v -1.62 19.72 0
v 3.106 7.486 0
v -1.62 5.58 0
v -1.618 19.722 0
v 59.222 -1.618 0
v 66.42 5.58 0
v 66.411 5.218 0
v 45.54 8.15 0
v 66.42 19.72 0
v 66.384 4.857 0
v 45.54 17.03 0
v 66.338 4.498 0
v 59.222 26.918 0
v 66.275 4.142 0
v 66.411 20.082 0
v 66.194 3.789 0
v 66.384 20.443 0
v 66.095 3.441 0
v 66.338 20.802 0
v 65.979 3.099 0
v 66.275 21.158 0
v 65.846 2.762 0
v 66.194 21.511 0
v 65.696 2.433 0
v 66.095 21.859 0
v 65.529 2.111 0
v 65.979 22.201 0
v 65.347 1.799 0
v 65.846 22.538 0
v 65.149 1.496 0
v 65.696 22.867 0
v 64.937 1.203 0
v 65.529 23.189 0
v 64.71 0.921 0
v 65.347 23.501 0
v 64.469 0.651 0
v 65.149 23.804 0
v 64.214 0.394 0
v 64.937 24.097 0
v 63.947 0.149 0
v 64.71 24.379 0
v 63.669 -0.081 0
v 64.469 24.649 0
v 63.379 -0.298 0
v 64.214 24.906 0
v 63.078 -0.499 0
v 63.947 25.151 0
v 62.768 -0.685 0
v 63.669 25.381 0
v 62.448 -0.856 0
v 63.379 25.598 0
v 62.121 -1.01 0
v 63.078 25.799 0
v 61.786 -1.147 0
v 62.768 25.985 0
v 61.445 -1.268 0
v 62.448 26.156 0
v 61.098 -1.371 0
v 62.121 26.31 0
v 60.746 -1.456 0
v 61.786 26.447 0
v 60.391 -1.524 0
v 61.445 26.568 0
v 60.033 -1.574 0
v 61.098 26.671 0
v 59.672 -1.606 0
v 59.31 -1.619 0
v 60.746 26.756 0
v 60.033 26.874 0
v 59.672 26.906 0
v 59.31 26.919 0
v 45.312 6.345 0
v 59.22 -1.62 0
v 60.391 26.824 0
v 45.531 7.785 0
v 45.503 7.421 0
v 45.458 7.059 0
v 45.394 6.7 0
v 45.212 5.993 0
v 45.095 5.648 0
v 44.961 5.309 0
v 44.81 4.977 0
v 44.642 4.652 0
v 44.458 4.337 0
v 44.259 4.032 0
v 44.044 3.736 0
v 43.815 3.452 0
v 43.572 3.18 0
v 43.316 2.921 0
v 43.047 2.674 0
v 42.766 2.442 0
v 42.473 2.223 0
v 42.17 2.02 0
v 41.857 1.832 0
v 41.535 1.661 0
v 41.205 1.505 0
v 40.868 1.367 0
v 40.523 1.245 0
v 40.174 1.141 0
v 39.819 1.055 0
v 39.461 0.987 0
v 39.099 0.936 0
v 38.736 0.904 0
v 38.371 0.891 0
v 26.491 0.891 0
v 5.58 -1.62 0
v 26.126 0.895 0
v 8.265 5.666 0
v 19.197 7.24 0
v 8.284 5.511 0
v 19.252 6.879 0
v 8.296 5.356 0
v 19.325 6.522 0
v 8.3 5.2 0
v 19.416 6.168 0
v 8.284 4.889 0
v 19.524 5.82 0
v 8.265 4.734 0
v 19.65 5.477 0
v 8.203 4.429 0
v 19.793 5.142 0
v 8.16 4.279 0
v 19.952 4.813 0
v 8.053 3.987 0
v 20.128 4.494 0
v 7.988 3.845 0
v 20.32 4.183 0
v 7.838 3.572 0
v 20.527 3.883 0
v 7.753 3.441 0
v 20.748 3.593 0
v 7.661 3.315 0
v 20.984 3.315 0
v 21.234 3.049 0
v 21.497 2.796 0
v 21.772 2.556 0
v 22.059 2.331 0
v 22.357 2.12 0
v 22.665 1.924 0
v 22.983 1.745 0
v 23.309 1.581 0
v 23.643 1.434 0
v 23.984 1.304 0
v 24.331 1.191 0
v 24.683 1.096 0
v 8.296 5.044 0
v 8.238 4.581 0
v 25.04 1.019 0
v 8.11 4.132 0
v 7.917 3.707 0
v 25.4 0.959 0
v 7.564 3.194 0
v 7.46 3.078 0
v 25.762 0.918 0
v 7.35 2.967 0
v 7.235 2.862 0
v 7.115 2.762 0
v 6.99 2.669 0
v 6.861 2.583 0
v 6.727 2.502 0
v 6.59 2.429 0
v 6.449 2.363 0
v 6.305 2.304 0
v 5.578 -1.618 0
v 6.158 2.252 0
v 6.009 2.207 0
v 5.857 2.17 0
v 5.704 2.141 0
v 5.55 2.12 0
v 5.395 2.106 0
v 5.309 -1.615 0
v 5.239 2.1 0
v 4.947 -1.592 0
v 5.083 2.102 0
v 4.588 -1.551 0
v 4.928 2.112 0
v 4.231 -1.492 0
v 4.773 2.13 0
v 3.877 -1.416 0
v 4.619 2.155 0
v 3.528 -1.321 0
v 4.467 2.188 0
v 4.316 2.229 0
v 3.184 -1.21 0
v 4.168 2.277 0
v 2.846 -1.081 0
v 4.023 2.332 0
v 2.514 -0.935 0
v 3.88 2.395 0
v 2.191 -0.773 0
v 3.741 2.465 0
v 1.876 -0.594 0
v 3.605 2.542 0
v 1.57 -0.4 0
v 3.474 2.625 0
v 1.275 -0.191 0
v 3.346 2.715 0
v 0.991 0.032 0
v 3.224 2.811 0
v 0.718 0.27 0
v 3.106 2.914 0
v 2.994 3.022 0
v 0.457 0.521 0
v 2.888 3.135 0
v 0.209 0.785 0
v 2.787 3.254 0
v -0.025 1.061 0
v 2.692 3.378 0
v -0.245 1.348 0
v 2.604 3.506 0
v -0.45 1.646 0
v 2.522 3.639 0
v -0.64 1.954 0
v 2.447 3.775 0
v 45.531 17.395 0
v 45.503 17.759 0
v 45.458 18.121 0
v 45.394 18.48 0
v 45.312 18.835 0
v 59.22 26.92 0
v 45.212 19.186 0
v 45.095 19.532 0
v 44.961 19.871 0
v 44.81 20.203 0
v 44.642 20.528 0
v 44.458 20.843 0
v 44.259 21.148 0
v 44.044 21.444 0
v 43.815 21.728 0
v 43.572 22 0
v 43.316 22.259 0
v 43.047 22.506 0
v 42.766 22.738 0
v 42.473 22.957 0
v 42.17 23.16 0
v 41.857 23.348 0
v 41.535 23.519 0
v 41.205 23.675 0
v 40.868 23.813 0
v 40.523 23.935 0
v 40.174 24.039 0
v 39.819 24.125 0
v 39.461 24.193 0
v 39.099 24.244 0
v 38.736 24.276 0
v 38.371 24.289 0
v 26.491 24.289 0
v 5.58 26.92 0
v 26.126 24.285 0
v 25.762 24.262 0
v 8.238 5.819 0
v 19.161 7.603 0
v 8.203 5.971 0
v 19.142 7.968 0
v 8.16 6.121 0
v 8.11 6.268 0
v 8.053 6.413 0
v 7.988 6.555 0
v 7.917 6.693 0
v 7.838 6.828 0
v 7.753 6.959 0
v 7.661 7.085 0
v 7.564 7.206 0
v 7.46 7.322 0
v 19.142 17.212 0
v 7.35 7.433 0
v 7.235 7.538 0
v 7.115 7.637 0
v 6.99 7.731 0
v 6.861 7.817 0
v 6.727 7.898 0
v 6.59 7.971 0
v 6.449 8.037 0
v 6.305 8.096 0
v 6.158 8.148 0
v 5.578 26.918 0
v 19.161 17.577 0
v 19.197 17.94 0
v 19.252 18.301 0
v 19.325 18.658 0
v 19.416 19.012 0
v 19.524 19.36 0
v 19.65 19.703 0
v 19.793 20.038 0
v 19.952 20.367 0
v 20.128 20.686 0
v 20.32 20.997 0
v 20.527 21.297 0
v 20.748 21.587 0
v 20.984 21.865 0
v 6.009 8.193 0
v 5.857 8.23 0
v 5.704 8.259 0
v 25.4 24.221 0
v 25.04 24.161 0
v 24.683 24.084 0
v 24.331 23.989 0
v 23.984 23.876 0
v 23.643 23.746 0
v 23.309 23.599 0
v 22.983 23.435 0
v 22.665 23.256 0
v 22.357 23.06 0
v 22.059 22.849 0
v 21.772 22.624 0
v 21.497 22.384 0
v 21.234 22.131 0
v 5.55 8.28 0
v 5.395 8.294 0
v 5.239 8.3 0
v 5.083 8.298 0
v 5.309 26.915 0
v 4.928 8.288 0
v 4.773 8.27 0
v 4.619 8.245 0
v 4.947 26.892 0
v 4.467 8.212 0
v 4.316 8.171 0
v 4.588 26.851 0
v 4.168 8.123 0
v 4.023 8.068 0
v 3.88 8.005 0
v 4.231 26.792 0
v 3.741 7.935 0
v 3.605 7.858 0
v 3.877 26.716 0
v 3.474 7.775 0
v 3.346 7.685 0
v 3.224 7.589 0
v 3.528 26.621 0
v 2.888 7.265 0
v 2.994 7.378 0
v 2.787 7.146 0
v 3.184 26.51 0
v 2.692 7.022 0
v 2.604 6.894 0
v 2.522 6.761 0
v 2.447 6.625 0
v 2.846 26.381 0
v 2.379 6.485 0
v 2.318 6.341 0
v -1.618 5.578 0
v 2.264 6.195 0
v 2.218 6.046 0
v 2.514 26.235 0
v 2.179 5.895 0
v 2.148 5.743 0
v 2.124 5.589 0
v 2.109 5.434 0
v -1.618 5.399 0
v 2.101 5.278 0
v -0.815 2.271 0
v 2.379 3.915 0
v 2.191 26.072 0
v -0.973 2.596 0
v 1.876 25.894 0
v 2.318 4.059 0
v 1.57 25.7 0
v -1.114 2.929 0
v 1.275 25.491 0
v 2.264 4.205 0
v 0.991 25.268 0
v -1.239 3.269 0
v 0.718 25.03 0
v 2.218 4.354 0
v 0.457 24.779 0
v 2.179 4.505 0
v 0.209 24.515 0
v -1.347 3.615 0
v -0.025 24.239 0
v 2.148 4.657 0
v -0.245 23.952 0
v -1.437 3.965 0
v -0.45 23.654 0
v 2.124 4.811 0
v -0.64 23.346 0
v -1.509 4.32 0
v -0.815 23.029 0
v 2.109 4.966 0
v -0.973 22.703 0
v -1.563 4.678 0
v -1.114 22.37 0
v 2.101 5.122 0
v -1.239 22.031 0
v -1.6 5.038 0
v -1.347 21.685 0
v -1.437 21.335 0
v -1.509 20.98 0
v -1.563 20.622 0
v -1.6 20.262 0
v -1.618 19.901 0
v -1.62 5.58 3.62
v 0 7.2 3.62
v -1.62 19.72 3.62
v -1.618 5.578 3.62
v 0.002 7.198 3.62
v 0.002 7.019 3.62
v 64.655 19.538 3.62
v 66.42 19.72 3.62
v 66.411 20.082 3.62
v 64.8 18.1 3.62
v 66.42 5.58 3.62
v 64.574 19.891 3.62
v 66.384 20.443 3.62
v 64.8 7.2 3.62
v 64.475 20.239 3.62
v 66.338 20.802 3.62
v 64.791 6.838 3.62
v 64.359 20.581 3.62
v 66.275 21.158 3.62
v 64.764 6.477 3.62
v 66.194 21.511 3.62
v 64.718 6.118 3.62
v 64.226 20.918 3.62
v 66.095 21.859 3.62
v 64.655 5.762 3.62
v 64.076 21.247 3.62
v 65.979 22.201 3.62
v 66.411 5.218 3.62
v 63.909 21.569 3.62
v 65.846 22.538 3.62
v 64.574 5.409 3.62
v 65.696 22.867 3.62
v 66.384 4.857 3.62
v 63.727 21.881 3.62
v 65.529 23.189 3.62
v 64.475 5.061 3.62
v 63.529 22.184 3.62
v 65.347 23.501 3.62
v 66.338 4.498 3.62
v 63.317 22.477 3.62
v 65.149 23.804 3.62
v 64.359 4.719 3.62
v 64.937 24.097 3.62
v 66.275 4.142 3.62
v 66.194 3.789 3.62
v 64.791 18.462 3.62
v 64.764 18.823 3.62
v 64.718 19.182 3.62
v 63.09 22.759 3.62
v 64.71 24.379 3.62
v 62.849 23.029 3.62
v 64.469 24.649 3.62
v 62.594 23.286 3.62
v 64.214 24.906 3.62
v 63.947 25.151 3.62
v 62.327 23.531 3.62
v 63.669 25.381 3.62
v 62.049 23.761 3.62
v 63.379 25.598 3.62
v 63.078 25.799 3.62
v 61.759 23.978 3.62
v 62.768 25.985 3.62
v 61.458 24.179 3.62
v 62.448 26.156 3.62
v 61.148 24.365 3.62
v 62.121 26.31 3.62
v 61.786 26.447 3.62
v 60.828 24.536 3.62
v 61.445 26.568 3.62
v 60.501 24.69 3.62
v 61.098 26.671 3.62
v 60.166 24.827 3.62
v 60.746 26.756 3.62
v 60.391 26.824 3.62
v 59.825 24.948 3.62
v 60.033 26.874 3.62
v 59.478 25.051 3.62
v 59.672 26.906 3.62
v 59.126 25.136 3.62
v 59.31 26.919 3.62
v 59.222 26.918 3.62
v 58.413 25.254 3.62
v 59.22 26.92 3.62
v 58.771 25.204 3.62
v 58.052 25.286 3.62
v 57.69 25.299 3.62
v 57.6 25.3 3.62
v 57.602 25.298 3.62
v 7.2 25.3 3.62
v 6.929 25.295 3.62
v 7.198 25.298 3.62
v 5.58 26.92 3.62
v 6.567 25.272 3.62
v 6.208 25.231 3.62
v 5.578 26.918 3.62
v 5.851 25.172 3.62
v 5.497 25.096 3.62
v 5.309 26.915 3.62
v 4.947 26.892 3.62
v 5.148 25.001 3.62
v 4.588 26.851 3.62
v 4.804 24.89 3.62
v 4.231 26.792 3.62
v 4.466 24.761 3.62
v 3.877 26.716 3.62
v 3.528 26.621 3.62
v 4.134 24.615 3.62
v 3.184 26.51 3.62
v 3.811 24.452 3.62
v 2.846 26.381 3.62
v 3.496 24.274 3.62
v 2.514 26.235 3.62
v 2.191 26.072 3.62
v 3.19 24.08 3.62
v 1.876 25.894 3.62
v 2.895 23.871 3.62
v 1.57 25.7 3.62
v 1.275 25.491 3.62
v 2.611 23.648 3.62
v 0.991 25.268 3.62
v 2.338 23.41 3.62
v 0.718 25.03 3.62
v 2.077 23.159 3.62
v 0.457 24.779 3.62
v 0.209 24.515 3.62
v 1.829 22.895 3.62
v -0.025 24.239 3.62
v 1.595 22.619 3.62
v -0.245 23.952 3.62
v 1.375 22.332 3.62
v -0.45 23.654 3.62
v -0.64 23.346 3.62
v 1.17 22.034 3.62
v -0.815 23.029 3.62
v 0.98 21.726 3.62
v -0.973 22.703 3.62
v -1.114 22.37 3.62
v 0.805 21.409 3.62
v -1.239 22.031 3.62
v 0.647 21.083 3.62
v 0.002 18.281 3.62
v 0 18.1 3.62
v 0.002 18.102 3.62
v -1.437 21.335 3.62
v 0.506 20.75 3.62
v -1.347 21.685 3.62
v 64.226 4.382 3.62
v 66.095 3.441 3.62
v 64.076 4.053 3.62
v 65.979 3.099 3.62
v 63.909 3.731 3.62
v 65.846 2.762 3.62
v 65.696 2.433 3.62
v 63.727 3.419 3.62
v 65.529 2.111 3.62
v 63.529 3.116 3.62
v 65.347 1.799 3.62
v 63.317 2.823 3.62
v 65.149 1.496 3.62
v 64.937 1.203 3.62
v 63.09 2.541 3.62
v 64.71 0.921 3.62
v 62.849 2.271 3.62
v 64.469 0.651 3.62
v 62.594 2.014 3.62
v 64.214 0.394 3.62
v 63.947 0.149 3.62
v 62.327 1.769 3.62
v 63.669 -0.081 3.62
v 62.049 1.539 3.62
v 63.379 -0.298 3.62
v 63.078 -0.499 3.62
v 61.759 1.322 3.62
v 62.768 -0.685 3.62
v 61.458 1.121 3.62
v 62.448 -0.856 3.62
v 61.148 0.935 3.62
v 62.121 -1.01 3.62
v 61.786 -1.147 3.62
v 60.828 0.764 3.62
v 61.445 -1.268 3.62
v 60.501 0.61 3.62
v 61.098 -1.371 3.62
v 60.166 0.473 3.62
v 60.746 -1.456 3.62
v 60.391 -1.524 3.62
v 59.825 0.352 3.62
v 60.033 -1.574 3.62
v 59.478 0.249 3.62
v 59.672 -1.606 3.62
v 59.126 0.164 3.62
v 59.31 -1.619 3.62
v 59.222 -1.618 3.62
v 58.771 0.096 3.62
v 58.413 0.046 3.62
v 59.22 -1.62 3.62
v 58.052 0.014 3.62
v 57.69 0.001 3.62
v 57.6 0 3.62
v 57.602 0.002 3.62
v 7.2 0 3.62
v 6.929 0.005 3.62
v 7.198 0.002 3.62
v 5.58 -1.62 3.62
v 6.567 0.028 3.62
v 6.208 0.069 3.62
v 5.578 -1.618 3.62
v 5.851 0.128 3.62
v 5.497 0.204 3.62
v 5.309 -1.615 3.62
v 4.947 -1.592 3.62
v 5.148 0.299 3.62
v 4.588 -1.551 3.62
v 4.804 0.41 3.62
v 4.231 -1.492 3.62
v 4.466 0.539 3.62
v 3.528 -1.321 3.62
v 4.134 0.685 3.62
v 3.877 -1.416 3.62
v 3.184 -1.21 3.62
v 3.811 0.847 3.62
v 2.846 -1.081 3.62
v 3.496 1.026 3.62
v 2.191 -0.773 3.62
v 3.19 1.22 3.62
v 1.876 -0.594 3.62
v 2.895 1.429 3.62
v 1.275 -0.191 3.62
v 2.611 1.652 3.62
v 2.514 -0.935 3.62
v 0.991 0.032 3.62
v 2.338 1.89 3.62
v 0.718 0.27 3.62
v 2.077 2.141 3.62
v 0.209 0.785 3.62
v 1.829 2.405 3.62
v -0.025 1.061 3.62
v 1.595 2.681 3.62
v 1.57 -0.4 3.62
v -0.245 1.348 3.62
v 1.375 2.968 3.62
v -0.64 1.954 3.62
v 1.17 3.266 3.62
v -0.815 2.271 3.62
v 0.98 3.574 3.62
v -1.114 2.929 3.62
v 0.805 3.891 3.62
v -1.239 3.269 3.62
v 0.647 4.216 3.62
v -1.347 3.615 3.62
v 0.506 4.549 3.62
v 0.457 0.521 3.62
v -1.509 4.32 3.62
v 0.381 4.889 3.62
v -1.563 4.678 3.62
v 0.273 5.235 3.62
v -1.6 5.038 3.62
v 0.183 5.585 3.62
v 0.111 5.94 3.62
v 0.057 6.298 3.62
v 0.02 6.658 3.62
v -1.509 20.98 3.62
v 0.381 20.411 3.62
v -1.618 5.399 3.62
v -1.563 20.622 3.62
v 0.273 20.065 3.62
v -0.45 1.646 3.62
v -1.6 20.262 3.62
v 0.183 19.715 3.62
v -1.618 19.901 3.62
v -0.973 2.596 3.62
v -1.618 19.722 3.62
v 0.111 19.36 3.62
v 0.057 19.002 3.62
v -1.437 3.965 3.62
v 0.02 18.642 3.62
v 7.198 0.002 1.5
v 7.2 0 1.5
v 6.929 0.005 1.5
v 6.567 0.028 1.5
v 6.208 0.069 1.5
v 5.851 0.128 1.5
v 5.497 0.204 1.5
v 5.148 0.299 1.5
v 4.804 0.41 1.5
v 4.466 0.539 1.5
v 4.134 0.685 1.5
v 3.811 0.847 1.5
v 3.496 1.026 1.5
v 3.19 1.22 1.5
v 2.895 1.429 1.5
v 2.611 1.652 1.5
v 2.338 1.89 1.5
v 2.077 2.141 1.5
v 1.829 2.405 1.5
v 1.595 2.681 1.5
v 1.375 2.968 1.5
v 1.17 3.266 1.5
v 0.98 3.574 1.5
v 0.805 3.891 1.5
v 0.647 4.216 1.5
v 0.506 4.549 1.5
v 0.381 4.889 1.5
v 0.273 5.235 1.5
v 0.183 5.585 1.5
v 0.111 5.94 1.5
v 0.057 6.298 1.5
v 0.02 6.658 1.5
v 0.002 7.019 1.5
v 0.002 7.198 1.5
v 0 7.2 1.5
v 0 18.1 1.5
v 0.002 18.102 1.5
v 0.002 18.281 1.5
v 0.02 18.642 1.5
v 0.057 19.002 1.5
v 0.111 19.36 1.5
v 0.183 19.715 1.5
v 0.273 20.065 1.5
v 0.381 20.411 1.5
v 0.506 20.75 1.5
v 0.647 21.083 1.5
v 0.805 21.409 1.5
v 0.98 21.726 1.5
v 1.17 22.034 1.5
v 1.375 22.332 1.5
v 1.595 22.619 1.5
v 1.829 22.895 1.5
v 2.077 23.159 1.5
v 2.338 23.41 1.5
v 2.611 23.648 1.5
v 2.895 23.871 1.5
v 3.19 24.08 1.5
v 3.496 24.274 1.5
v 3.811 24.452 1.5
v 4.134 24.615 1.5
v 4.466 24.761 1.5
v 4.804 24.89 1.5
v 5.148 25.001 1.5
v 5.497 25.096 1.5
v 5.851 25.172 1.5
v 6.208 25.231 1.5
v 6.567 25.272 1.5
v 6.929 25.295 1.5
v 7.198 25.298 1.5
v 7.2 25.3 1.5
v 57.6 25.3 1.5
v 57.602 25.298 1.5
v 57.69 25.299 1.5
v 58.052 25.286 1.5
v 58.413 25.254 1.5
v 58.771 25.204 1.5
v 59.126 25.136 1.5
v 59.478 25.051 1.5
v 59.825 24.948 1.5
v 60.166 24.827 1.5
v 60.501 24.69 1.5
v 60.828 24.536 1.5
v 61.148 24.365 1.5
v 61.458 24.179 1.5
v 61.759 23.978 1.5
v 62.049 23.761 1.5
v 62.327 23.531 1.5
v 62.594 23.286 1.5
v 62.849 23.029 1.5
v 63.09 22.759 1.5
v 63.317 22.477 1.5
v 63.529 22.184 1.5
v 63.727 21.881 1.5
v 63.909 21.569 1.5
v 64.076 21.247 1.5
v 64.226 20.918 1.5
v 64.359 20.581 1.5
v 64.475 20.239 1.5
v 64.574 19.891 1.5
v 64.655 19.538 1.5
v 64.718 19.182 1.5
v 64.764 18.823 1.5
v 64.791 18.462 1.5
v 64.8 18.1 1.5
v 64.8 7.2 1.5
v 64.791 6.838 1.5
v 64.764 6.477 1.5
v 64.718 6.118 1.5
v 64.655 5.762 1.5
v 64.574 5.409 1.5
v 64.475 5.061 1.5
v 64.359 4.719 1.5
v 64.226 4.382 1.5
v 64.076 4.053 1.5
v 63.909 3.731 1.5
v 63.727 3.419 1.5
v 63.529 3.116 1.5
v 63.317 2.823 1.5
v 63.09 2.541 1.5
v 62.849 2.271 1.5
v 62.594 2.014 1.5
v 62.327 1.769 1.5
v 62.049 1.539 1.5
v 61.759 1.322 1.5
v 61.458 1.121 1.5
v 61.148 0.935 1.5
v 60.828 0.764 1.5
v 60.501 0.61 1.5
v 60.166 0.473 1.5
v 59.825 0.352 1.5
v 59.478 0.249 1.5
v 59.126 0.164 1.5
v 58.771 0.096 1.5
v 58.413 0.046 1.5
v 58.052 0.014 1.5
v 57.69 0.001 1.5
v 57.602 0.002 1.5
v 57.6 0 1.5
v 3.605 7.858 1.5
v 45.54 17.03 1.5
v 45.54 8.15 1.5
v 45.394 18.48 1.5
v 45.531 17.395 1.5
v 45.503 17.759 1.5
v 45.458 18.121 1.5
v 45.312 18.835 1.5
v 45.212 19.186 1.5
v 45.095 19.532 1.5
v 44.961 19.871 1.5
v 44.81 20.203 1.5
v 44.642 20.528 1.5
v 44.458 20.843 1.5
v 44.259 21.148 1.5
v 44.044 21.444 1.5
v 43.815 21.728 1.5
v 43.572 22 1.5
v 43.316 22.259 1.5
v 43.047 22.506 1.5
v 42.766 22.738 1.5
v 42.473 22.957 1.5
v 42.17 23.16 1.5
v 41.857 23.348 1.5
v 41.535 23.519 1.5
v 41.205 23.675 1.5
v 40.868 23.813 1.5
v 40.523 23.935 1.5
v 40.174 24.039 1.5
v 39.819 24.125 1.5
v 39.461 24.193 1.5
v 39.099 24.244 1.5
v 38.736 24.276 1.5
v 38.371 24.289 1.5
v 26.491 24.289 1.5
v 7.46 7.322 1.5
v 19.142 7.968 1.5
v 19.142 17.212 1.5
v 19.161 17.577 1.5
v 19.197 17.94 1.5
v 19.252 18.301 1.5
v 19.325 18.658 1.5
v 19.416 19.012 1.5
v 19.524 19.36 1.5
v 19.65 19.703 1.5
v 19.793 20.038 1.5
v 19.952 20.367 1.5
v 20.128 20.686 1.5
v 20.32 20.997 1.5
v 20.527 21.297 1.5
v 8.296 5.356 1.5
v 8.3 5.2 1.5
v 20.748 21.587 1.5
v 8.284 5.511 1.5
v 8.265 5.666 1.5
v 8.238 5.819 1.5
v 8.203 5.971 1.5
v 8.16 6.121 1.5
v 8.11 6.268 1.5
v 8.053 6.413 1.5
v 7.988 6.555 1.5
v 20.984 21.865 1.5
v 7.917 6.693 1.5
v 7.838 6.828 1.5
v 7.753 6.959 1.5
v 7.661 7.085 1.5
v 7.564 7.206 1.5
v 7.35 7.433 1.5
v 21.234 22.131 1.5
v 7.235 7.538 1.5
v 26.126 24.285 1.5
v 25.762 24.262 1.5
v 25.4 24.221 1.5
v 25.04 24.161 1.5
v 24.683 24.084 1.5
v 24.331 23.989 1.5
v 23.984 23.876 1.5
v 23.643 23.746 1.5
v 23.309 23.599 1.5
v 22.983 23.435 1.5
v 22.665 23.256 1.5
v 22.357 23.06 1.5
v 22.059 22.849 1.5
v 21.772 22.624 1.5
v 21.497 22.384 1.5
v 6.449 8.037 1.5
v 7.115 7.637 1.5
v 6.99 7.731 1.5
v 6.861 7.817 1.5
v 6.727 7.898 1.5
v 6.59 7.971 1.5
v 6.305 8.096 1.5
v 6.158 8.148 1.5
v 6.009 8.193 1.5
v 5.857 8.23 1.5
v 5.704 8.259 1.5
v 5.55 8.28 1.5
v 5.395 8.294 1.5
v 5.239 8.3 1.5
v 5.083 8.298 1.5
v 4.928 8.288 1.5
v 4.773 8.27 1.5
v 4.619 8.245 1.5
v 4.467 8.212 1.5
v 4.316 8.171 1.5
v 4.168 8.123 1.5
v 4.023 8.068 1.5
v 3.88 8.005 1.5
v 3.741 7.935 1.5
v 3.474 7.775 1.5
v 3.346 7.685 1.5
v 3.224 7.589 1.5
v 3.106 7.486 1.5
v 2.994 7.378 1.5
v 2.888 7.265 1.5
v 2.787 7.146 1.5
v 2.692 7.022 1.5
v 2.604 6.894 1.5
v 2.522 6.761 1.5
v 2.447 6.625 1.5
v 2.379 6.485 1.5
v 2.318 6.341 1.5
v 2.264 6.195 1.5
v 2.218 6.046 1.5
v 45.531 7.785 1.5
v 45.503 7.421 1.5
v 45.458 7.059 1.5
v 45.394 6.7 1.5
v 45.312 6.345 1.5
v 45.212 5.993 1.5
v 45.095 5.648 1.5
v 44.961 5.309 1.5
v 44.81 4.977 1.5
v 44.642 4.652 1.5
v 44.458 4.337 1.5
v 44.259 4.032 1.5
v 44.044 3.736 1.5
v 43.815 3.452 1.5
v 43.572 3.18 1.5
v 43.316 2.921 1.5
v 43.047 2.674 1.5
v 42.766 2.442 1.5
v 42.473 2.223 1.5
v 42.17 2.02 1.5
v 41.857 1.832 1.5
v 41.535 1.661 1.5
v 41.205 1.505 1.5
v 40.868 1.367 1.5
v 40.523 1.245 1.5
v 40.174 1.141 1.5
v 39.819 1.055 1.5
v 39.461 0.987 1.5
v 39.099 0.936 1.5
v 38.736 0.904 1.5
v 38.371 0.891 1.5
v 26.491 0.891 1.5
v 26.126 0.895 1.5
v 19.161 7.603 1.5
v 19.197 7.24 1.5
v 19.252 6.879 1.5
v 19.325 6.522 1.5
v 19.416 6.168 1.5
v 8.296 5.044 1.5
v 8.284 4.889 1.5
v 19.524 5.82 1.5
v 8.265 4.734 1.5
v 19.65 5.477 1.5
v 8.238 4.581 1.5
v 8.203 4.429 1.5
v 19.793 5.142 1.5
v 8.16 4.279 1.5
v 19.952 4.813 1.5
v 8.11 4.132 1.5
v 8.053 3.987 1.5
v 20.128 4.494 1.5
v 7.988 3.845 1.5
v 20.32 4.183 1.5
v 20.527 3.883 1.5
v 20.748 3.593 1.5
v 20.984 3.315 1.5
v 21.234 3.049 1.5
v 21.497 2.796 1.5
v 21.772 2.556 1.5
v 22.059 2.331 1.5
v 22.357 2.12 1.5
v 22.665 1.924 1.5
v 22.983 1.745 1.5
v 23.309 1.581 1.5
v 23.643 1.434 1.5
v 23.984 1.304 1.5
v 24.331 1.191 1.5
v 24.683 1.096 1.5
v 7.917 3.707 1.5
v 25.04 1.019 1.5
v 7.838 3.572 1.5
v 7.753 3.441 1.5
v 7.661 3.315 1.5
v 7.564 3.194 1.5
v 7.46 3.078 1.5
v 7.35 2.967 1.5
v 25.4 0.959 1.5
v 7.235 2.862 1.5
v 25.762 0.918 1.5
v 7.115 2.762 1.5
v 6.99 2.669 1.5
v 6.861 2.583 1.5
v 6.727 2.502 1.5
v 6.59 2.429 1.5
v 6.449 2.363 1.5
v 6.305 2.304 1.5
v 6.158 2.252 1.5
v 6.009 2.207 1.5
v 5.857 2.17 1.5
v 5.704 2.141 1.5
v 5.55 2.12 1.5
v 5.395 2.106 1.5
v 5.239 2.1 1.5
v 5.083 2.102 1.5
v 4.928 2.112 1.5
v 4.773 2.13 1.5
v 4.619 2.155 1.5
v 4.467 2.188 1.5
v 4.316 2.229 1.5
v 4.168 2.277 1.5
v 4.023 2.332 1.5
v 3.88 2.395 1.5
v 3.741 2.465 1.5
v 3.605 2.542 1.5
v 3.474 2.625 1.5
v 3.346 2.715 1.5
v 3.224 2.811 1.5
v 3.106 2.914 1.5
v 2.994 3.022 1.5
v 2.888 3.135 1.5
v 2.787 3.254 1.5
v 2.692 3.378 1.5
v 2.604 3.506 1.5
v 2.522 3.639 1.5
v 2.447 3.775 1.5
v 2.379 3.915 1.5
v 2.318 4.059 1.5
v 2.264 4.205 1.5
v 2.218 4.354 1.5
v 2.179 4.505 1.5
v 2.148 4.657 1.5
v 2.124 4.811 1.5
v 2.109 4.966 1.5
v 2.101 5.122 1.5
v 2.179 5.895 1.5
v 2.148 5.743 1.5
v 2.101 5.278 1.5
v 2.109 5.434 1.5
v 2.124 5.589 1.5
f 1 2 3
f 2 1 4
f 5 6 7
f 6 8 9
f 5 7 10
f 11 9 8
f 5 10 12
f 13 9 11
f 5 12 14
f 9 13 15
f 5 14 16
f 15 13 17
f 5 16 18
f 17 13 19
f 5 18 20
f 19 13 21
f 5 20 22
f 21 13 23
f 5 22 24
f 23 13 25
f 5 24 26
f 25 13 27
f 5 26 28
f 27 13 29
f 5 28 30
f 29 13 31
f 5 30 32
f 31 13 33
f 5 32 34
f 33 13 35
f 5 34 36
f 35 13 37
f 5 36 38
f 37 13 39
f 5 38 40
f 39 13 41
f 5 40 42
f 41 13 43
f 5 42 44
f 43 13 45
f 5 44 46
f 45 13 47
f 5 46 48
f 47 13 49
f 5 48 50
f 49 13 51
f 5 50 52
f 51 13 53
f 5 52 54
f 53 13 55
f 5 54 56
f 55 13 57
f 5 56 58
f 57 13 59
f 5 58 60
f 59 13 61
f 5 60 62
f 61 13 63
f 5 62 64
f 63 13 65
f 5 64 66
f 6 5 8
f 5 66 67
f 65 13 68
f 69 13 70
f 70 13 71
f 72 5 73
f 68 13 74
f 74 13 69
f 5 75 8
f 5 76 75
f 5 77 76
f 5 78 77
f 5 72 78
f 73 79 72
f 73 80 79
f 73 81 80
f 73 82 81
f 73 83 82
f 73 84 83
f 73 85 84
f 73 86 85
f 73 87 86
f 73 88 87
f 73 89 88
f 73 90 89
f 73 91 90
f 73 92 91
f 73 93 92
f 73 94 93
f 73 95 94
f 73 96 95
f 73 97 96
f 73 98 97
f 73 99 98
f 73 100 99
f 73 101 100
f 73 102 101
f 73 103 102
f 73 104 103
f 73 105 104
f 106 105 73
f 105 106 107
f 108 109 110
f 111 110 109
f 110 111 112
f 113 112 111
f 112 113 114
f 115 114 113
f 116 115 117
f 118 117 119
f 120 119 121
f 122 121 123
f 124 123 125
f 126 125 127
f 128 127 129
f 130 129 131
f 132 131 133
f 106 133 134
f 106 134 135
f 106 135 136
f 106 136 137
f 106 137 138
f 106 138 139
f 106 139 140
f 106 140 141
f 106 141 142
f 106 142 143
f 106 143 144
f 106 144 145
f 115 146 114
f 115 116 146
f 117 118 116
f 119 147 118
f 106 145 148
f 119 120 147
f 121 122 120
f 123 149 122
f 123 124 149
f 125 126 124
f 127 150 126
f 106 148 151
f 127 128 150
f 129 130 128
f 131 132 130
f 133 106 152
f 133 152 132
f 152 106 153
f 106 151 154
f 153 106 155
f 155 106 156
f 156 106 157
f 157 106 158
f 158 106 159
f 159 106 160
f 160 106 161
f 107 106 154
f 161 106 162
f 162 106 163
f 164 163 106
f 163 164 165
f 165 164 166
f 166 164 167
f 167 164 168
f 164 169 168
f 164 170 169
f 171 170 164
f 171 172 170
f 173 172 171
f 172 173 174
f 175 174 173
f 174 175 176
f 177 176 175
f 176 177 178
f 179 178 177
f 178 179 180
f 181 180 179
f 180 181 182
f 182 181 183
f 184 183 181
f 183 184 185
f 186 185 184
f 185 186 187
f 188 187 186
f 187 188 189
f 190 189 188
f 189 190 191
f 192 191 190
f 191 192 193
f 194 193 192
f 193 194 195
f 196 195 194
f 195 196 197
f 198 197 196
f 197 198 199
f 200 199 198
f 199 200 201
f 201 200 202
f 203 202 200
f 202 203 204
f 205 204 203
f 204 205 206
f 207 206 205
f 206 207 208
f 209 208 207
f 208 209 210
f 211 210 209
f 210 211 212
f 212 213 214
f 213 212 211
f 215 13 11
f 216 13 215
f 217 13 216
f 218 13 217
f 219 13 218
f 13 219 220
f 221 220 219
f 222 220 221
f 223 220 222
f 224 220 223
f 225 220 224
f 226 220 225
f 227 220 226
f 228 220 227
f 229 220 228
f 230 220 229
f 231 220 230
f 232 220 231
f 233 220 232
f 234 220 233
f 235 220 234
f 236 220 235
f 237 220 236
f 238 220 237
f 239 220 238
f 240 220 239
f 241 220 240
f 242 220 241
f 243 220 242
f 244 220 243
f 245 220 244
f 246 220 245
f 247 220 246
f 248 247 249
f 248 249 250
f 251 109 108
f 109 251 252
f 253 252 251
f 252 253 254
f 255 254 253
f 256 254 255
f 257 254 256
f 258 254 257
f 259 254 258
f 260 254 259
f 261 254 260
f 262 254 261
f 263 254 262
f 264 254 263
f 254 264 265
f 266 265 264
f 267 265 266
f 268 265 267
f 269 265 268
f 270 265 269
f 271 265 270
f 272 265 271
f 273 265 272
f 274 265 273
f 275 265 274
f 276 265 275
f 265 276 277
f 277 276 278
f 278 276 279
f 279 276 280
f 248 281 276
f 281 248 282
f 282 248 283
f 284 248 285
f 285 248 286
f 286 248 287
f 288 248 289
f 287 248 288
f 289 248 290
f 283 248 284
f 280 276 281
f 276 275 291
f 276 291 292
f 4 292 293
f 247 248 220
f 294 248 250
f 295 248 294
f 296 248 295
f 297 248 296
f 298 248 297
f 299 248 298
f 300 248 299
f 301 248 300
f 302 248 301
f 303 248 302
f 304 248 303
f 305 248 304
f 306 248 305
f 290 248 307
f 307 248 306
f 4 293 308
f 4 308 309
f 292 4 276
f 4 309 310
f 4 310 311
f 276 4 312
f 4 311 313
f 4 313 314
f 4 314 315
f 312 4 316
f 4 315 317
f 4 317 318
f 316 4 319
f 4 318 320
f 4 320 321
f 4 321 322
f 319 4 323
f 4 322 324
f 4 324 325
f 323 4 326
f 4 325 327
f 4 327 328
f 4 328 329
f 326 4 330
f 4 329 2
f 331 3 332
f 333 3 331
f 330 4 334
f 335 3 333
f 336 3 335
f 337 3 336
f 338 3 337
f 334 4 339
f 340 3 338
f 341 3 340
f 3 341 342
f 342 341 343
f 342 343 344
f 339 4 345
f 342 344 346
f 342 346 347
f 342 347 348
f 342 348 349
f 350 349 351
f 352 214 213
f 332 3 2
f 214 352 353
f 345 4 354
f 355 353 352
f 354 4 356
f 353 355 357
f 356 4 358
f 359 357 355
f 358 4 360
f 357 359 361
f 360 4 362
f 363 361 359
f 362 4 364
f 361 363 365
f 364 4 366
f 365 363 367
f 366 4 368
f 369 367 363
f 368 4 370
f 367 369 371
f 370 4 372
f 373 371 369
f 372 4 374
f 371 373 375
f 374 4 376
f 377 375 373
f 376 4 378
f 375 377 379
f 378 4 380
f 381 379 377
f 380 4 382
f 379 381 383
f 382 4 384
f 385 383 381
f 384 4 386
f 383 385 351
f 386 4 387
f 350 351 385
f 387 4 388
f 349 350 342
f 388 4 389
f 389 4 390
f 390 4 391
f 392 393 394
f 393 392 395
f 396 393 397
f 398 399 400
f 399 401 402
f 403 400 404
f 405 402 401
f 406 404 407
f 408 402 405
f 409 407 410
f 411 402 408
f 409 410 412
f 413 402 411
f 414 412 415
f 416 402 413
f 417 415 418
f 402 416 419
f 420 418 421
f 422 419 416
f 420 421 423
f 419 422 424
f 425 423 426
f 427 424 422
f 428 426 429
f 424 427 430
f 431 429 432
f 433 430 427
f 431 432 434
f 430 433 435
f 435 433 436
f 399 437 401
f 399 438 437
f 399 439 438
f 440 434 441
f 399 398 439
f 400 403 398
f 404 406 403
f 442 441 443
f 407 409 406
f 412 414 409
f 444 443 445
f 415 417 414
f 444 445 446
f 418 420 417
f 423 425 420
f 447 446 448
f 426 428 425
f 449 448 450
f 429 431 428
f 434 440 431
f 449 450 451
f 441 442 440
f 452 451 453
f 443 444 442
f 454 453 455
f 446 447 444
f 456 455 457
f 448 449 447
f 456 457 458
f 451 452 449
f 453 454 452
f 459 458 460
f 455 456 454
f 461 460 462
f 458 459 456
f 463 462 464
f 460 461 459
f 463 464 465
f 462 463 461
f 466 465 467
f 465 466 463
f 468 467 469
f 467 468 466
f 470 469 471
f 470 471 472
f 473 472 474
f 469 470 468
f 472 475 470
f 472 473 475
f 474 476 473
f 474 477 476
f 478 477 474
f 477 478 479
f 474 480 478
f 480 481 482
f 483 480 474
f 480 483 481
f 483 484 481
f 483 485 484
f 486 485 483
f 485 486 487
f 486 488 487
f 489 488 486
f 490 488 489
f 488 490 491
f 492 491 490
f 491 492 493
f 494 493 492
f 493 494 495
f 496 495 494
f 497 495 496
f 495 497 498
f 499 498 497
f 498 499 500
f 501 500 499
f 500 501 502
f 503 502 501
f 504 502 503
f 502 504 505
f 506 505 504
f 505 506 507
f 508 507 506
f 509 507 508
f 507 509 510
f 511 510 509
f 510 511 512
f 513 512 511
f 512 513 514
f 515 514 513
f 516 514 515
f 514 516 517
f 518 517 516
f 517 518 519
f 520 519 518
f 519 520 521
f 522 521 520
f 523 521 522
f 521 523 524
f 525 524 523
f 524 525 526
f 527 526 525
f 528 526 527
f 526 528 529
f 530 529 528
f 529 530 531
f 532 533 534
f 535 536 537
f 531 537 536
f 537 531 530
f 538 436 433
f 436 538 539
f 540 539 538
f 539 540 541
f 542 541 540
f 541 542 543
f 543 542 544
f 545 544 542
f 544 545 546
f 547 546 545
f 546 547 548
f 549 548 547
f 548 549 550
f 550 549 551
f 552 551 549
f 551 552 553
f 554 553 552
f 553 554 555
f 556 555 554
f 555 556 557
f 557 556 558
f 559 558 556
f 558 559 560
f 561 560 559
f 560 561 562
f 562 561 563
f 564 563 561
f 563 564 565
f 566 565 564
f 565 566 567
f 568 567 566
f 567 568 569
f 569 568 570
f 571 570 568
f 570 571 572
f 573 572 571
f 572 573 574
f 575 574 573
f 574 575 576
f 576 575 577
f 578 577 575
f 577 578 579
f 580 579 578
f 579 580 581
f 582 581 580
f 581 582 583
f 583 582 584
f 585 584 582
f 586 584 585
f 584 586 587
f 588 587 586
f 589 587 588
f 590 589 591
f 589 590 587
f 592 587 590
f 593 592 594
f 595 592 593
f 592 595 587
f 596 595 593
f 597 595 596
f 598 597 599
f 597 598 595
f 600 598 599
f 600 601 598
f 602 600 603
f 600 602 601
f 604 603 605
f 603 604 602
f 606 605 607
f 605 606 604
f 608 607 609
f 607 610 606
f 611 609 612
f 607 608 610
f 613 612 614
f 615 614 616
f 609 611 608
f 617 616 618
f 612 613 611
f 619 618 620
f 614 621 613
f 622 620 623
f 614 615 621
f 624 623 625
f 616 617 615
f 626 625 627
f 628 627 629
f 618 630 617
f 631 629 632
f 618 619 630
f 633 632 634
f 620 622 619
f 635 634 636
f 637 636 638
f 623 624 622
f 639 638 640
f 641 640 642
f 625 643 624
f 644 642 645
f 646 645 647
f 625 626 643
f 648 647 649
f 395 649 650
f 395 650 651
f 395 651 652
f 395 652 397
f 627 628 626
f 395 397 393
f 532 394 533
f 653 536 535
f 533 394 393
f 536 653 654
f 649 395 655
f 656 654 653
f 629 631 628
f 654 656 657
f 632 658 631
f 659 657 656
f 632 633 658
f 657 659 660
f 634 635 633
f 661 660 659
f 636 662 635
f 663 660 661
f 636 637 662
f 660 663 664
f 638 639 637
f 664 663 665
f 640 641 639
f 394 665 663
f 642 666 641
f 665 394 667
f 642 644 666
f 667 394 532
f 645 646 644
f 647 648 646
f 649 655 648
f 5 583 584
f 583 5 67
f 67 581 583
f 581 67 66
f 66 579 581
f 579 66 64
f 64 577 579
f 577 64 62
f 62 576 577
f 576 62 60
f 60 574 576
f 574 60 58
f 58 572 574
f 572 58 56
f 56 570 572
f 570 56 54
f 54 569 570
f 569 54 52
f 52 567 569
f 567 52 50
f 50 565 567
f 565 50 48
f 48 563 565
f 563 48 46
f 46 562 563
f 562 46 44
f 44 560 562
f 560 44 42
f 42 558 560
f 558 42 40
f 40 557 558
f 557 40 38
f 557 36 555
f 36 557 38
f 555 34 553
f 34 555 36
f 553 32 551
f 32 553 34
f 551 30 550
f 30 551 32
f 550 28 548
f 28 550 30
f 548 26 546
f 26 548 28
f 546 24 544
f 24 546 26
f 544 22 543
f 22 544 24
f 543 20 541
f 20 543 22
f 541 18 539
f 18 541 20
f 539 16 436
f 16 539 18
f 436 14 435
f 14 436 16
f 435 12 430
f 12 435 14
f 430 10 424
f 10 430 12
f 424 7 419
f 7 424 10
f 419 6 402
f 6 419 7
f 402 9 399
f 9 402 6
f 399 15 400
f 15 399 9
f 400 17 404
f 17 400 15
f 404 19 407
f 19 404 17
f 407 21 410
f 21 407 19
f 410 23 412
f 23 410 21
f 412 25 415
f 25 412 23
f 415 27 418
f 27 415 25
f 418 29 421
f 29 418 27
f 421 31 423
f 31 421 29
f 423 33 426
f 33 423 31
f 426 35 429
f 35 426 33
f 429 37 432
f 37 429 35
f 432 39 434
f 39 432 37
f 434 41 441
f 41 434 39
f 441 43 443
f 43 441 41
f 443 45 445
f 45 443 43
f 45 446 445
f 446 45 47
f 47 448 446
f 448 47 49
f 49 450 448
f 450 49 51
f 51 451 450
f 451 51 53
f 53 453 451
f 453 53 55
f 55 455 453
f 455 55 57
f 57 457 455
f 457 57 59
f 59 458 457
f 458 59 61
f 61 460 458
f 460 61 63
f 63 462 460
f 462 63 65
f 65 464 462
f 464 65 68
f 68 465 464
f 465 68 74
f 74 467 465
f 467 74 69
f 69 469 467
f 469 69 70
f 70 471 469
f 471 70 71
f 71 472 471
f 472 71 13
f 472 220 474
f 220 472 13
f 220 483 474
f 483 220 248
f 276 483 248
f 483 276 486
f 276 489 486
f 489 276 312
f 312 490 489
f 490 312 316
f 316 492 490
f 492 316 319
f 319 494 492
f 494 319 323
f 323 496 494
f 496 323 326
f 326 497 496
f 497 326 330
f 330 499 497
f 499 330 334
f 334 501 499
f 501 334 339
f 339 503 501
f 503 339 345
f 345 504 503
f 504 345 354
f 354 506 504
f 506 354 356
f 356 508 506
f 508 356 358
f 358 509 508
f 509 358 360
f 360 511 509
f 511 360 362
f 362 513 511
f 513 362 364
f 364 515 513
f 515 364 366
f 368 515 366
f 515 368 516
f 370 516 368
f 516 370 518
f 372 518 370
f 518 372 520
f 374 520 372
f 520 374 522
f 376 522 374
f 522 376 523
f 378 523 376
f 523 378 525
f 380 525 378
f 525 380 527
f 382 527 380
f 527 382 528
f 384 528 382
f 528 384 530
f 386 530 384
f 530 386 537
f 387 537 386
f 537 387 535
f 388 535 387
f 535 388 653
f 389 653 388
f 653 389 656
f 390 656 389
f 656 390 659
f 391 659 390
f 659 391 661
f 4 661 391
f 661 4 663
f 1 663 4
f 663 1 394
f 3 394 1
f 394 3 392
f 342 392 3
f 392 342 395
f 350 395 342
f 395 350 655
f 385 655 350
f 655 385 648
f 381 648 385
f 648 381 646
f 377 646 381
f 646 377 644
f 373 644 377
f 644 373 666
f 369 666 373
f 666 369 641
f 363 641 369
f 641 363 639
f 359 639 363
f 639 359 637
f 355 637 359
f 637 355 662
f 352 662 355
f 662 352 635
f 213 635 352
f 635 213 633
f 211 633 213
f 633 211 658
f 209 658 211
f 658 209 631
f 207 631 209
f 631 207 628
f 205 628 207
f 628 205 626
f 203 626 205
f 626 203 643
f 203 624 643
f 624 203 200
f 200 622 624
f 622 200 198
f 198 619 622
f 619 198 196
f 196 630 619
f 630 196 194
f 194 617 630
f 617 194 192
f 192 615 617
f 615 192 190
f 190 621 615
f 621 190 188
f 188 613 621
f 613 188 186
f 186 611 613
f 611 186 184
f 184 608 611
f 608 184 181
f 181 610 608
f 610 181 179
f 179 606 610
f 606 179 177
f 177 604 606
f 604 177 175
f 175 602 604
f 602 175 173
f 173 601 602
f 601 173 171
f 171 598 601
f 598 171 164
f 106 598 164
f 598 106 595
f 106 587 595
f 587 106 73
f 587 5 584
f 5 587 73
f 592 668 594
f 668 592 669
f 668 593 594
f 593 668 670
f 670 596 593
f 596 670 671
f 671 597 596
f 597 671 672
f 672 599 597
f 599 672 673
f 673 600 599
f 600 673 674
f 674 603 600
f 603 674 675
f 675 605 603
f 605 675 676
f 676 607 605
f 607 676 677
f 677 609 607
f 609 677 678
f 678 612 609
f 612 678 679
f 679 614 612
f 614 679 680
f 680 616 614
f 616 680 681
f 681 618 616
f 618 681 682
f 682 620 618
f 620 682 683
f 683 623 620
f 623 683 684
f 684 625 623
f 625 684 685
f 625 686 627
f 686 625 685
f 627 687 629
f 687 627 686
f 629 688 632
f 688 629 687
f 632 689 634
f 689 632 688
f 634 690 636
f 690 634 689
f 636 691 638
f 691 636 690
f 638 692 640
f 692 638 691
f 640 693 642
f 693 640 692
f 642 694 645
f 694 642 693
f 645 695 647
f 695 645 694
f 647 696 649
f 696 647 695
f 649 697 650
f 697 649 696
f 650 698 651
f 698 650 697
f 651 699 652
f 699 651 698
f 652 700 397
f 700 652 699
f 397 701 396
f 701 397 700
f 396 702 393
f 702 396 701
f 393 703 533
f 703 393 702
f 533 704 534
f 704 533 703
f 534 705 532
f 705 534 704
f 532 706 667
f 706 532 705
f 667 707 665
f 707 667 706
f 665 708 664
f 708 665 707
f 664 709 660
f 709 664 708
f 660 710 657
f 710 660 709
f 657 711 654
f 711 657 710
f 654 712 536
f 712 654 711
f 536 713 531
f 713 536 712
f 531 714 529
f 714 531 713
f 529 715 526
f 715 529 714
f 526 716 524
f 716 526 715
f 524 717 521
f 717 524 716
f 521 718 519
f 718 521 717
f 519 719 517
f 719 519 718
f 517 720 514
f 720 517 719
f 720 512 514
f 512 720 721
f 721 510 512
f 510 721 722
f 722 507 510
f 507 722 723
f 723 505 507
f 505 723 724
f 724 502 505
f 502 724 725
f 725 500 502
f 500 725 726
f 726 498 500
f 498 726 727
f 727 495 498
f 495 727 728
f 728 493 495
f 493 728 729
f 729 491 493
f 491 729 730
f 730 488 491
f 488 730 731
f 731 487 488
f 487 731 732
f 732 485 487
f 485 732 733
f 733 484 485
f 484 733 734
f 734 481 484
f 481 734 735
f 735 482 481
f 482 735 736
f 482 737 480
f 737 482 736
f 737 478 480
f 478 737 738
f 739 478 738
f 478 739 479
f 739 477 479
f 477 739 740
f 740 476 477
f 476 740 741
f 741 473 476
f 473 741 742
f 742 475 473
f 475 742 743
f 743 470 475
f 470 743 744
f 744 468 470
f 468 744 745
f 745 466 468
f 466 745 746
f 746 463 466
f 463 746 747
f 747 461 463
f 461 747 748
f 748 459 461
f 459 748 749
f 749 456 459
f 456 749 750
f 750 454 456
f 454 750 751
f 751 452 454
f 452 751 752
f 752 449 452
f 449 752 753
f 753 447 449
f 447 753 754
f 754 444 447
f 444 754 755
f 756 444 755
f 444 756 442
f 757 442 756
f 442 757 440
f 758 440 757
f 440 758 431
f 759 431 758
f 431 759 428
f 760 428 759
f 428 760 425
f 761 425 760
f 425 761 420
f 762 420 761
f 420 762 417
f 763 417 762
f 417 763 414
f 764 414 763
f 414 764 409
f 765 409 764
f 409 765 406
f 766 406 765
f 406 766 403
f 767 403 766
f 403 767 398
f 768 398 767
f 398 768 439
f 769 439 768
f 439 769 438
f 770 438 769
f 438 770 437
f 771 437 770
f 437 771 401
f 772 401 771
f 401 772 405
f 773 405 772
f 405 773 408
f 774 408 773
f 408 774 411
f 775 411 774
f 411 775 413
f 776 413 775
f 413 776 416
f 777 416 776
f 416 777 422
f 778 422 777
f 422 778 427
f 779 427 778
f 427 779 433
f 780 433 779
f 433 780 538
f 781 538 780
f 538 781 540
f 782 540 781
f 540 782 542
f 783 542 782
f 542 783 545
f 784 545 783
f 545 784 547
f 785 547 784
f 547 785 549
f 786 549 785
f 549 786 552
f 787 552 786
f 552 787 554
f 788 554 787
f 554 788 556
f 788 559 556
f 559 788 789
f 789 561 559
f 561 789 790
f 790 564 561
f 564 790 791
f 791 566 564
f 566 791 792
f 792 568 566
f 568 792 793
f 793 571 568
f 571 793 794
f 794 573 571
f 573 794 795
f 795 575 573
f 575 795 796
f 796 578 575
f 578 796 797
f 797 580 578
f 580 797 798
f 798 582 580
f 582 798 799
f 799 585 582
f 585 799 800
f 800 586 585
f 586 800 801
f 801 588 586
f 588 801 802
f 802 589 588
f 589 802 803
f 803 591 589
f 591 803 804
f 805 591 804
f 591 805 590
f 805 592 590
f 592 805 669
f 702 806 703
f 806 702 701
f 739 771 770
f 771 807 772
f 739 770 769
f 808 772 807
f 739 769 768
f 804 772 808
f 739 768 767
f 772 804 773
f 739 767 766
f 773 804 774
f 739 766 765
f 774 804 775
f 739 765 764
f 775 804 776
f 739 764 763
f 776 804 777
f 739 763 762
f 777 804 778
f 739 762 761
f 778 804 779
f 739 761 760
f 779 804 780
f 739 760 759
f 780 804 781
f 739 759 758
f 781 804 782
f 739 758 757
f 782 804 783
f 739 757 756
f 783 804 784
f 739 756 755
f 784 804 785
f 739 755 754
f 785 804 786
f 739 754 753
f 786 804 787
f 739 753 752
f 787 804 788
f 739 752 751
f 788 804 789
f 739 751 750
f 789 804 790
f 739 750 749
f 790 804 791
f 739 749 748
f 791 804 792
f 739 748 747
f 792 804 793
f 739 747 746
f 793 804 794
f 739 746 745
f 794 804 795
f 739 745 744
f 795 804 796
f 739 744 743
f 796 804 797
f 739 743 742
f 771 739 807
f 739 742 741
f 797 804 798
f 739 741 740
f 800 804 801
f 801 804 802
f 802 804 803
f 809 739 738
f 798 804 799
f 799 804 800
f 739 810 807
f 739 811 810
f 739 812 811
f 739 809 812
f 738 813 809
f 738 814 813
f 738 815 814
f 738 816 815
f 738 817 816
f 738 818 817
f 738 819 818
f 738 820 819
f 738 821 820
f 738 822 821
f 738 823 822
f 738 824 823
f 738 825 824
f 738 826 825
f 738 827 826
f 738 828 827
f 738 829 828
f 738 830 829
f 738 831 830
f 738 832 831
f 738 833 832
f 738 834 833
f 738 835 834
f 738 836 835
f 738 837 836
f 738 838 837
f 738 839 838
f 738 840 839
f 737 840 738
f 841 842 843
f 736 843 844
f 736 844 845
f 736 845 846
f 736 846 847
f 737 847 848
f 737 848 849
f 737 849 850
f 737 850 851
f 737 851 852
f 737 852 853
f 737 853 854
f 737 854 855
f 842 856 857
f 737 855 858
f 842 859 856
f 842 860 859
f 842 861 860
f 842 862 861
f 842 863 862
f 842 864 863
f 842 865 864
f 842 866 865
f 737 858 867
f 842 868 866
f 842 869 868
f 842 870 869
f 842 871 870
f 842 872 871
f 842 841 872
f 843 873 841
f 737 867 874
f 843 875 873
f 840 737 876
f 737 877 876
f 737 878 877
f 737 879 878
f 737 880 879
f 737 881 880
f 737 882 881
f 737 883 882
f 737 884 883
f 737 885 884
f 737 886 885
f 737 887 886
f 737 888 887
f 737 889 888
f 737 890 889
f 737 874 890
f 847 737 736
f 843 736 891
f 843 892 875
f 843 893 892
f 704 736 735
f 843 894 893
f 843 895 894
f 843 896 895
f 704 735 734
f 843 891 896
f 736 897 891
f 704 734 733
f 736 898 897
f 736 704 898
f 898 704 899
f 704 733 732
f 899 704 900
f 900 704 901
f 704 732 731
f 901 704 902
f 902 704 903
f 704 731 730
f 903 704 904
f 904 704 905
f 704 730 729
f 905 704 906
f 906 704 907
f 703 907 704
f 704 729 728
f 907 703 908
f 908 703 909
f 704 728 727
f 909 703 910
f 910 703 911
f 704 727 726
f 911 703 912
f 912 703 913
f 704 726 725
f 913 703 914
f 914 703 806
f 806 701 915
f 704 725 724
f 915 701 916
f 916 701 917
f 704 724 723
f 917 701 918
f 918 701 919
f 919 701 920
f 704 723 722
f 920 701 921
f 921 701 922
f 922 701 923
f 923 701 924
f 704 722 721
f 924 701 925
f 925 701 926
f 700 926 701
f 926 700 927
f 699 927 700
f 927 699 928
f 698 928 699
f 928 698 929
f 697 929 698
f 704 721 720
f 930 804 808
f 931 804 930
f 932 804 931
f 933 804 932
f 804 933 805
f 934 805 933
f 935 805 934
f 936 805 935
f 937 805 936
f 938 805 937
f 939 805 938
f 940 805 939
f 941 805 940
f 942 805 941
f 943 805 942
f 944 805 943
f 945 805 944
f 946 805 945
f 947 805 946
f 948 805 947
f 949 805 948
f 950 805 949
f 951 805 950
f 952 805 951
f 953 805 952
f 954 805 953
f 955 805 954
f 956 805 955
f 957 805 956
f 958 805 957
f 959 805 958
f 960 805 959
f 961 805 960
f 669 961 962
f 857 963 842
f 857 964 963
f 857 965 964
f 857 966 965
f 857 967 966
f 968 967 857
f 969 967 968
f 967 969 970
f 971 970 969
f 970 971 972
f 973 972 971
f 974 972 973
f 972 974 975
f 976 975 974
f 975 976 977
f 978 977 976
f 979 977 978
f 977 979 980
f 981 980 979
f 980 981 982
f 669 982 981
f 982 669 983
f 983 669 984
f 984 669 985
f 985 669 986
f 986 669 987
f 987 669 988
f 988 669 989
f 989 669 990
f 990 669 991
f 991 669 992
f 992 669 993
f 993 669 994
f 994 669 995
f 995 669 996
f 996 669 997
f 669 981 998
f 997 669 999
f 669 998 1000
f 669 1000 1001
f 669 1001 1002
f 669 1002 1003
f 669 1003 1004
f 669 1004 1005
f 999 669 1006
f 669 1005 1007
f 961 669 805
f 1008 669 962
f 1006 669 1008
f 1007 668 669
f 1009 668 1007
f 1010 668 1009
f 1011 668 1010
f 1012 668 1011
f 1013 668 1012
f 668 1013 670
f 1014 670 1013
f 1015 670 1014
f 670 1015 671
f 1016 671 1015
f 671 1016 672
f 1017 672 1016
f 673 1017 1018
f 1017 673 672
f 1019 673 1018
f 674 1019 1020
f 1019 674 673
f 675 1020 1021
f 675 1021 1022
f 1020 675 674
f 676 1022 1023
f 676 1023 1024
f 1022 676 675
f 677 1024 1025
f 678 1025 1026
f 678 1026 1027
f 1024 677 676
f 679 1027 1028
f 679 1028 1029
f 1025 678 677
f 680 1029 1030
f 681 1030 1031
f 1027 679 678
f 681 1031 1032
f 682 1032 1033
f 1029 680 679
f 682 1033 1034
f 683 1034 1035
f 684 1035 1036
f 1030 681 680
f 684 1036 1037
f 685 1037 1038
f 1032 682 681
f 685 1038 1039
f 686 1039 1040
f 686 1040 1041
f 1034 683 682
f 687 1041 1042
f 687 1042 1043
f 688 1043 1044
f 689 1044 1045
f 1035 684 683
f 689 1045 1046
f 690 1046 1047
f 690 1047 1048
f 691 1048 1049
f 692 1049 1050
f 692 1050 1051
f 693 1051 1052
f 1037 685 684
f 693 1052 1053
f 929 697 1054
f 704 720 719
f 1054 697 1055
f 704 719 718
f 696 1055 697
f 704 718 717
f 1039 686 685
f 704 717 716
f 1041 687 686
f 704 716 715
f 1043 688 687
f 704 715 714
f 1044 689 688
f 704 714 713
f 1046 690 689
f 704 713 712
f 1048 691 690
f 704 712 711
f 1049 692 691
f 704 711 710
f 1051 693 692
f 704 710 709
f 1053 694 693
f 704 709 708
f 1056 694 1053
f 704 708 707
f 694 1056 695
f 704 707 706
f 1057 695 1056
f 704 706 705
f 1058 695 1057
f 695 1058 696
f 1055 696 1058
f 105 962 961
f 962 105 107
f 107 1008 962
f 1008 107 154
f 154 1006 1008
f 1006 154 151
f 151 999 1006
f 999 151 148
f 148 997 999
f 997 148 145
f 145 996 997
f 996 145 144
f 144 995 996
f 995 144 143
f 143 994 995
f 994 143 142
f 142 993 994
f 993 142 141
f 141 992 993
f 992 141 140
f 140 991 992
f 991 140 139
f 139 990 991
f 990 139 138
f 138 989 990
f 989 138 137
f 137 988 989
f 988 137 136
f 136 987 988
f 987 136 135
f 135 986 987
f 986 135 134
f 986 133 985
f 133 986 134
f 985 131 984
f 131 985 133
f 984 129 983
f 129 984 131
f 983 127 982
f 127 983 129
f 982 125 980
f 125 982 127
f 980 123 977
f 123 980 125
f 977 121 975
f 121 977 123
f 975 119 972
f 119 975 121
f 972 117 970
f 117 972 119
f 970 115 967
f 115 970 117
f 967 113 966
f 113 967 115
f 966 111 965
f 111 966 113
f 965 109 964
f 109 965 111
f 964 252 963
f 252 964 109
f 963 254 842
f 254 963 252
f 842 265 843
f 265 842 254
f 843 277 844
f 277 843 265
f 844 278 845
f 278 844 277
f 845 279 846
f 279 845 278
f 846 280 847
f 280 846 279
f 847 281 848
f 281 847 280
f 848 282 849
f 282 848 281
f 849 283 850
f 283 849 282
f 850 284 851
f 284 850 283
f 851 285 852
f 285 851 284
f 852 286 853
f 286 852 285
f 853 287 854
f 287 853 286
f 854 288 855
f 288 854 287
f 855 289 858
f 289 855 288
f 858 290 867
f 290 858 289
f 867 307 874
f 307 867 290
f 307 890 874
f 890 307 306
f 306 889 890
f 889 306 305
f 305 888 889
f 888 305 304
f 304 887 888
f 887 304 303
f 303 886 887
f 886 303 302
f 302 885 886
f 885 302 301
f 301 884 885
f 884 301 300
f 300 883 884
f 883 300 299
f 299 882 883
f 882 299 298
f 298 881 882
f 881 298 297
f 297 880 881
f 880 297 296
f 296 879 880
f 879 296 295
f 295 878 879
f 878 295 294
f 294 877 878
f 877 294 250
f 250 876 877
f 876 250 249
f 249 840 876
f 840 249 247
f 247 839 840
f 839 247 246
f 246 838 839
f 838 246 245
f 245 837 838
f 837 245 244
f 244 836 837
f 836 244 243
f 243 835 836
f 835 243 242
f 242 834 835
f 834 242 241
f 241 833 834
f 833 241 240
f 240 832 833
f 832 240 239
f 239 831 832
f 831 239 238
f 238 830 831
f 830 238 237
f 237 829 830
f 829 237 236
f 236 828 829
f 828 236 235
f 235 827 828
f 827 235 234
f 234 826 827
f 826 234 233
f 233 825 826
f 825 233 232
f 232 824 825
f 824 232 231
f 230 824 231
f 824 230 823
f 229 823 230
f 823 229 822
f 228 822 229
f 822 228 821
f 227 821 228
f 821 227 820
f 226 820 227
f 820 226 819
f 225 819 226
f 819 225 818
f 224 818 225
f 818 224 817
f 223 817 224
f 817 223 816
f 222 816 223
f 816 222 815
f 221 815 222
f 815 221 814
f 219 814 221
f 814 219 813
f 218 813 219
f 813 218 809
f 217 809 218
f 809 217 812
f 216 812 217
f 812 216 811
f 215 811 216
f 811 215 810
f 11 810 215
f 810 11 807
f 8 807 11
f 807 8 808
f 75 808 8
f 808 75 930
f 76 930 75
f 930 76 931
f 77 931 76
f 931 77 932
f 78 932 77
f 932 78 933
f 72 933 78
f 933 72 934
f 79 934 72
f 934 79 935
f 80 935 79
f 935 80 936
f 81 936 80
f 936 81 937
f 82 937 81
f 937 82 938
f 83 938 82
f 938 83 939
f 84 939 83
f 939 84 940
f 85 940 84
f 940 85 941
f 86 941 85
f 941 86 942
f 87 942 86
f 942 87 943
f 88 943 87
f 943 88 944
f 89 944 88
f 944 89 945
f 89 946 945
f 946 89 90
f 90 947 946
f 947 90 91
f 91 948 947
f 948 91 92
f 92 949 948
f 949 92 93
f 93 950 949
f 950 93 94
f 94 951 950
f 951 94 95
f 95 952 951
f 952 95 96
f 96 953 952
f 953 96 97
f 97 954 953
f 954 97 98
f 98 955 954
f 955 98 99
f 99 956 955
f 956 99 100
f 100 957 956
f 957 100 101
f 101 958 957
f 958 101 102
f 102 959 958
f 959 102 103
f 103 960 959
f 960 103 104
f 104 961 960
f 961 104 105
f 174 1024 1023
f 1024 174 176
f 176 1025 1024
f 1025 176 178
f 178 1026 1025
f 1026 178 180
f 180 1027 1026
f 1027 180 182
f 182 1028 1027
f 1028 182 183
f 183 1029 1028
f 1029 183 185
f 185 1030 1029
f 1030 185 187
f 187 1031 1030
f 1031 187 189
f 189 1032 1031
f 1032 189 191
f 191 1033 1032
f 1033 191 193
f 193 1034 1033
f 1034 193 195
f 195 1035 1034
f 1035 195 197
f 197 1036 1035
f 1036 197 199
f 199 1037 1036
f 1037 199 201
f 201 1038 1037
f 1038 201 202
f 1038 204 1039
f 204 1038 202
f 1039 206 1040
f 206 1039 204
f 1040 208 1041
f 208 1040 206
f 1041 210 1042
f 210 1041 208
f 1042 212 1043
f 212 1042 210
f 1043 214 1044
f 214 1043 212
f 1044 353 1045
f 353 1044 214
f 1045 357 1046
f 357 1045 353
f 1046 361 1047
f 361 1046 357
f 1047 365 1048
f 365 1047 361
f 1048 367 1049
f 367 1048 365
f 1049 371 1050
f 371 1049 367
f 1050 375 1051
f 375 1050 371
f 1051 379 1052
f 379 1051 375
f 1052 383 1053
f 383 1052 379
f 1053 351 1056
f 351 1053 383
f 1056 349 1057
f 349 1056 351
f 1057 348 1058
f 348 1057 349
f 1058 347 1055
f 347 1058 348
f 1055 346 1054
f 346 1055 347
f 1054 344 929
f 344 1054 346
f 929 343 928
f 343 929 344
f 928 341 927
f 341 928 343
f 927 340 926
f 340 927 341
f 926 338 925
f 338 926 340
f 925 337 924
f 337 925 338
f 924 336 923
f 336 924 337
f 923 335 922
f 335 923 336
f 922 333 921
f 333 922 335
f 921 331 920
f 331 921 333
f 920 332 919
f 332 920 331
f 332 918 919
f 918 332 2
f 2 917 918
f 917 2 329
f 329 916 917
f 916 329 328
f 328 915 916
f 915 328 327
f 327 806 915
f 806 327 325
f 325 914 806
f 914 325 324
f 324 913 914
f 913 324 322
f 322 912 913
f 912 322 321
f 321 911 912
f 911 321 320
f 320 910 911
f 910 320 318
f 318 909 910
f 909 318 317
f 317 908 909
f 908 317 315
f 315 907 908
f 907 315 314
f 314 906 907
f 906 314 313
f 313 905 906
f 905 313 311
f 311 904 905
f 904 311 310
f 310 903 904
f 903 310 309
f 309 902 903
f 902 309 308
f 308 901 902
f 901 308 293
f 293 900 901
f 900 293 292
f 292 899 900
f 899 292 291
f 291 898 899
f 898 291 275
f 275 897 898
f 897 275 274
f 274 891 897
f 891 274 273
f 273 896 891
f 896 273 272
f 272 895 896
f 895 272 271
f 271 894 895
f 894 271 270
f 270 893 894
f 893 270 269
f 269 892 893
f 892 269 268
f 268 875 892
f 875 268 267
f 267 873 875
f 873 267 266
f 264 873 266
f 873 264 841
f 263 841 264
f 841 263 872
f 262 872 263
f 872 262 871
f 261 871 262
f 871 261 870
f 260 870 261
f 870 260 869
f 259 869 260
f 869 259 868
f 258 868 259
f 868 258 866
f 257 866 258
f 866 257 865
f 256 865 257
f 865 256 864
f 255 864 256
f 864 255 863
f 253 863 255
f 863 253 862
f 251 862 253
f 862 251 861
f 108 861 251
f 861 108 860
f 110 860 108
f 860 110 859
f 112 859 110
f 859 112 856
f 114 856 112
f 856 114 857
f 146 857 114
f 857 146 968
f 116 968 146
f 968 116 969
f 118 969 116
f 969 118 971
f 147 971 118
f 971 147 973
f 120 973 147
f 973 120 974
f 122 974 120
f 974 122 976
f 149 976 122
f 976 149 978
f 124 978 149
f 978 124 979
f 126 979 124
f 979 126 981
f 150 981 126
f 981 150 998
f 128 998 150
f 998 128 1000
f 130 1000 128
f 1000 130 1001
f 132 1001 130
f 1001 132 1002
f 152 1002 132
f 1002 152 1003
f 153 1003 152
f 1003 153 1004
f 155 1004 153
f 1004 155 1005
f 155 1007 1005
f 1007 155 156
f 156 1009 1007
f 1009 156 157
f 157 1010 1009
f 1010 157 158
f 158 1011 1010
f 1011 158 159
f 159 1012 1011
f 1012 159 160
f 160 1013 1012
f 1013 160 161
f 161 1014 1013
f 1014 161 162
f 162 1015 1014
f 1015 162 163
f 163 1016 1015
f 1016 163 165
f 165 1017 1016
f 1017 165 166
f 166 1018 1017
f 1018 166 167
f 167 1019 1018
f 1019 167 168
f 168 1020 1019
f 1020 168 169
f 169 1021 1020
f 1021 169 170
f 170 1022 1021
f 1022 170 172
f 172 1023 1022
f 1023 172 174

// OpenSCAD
// created by IndiePandaaaaa|Lukas
// encoding: utf-8

TOLERANCE = .12;
THICKNESS = 1.5;
$fn = $preview ? 25 : 125;

KEY_LENGTH = 64.8;
KEY_WIDTH = 25.3;
KEY_THICKNESS = 2;
KEY_RADIUS = 7.2;
KEY_HOLE = [6.2, 5.2, 5.2]; // diameter, X Pos, Y Pos

module case_side_popout() {
  module key_shape(size_added = 0) {
    circle_loc = [
      [KEY_RADIUS, KEY_RADIUS],
      [KEY_LENGTH - KEY_RADIUS + size_added * 2, KEY_RADIUS],
      [KEY_LENGTH - KEY_RADIUS + size_added * 2, KEY_WIDTH - KEY_RADIUS + size_added * 2],
      [KEY_RADIUS, KEY_WIDTH - KEY_RADIUS + size_added * 2],
    ];

    translate([-size_added, -size_added]) union() {
        polygon(
          [
            [0, KEY_RADIUS],
            [KEY_RADIUS, 0],
            [KEY_LENGTH - KEY_RADIUS + size_added * 2, 0],
            [KEY_LENGTH + size_added * 2, KEY_RADIUS],
            [KEY_LENGTH + size_added * 2, KEY_WIDTH - KEY_RADIUS + size_added * 2],
            [KEY_LENGTH - KEY_RADIUS + size_added * 2, KEY_WIDTH + size_added * 2],
            [KEY_RADIUS, KEY_WIDTH + size_added * 2],
            [0, KEY_WIDTH - KEY_RADIUS + size_added * 2],
          ]
        );

        for (i = [0:len(circle_loc) - 1]) {
          translate(circle_loc[i]) circle(r=KEY_RADIUS);
        }
      }
  }

  union() {
    linear_extrude(THICKNESS + KEY_THICKNESS + TOLERANCE) {
      // key border
      difference() {
        key_shape(size_added=THICKNESS + TOLERANCE); // outer contour
        key_shape(size_added=0); // inner contour
      }
    }
    linear_extrude(THICKNESS) {
      finger_hole = [18, 15, 3];
      difference() {
        key_shape(size_added=TOLERANCE * 2); // outer contour
        translate([KEY_LENGTH / 2 - finger_hole[0] / 2, KEY_WIDTH / 2 - finger_hole[1] / 2]) minkowski() {
            // inner contour
            translate([finger_hole[2], finger_hole[2]]) square([finger_hole[0] - finger_hole[2] * 2 - TOLERANCE, finger_hole[1] - finger_hole[2] * 2 - TOLERANCE]);
            circle(r=KEY_RADIUS + TOLERANCE / 2);
          }
        translate([KEY_HOLE[1], KEY_HOLE[2]]) circle(d=KEY_HOLE[0]);
      }
    }
  }
}

case_side_popout();
